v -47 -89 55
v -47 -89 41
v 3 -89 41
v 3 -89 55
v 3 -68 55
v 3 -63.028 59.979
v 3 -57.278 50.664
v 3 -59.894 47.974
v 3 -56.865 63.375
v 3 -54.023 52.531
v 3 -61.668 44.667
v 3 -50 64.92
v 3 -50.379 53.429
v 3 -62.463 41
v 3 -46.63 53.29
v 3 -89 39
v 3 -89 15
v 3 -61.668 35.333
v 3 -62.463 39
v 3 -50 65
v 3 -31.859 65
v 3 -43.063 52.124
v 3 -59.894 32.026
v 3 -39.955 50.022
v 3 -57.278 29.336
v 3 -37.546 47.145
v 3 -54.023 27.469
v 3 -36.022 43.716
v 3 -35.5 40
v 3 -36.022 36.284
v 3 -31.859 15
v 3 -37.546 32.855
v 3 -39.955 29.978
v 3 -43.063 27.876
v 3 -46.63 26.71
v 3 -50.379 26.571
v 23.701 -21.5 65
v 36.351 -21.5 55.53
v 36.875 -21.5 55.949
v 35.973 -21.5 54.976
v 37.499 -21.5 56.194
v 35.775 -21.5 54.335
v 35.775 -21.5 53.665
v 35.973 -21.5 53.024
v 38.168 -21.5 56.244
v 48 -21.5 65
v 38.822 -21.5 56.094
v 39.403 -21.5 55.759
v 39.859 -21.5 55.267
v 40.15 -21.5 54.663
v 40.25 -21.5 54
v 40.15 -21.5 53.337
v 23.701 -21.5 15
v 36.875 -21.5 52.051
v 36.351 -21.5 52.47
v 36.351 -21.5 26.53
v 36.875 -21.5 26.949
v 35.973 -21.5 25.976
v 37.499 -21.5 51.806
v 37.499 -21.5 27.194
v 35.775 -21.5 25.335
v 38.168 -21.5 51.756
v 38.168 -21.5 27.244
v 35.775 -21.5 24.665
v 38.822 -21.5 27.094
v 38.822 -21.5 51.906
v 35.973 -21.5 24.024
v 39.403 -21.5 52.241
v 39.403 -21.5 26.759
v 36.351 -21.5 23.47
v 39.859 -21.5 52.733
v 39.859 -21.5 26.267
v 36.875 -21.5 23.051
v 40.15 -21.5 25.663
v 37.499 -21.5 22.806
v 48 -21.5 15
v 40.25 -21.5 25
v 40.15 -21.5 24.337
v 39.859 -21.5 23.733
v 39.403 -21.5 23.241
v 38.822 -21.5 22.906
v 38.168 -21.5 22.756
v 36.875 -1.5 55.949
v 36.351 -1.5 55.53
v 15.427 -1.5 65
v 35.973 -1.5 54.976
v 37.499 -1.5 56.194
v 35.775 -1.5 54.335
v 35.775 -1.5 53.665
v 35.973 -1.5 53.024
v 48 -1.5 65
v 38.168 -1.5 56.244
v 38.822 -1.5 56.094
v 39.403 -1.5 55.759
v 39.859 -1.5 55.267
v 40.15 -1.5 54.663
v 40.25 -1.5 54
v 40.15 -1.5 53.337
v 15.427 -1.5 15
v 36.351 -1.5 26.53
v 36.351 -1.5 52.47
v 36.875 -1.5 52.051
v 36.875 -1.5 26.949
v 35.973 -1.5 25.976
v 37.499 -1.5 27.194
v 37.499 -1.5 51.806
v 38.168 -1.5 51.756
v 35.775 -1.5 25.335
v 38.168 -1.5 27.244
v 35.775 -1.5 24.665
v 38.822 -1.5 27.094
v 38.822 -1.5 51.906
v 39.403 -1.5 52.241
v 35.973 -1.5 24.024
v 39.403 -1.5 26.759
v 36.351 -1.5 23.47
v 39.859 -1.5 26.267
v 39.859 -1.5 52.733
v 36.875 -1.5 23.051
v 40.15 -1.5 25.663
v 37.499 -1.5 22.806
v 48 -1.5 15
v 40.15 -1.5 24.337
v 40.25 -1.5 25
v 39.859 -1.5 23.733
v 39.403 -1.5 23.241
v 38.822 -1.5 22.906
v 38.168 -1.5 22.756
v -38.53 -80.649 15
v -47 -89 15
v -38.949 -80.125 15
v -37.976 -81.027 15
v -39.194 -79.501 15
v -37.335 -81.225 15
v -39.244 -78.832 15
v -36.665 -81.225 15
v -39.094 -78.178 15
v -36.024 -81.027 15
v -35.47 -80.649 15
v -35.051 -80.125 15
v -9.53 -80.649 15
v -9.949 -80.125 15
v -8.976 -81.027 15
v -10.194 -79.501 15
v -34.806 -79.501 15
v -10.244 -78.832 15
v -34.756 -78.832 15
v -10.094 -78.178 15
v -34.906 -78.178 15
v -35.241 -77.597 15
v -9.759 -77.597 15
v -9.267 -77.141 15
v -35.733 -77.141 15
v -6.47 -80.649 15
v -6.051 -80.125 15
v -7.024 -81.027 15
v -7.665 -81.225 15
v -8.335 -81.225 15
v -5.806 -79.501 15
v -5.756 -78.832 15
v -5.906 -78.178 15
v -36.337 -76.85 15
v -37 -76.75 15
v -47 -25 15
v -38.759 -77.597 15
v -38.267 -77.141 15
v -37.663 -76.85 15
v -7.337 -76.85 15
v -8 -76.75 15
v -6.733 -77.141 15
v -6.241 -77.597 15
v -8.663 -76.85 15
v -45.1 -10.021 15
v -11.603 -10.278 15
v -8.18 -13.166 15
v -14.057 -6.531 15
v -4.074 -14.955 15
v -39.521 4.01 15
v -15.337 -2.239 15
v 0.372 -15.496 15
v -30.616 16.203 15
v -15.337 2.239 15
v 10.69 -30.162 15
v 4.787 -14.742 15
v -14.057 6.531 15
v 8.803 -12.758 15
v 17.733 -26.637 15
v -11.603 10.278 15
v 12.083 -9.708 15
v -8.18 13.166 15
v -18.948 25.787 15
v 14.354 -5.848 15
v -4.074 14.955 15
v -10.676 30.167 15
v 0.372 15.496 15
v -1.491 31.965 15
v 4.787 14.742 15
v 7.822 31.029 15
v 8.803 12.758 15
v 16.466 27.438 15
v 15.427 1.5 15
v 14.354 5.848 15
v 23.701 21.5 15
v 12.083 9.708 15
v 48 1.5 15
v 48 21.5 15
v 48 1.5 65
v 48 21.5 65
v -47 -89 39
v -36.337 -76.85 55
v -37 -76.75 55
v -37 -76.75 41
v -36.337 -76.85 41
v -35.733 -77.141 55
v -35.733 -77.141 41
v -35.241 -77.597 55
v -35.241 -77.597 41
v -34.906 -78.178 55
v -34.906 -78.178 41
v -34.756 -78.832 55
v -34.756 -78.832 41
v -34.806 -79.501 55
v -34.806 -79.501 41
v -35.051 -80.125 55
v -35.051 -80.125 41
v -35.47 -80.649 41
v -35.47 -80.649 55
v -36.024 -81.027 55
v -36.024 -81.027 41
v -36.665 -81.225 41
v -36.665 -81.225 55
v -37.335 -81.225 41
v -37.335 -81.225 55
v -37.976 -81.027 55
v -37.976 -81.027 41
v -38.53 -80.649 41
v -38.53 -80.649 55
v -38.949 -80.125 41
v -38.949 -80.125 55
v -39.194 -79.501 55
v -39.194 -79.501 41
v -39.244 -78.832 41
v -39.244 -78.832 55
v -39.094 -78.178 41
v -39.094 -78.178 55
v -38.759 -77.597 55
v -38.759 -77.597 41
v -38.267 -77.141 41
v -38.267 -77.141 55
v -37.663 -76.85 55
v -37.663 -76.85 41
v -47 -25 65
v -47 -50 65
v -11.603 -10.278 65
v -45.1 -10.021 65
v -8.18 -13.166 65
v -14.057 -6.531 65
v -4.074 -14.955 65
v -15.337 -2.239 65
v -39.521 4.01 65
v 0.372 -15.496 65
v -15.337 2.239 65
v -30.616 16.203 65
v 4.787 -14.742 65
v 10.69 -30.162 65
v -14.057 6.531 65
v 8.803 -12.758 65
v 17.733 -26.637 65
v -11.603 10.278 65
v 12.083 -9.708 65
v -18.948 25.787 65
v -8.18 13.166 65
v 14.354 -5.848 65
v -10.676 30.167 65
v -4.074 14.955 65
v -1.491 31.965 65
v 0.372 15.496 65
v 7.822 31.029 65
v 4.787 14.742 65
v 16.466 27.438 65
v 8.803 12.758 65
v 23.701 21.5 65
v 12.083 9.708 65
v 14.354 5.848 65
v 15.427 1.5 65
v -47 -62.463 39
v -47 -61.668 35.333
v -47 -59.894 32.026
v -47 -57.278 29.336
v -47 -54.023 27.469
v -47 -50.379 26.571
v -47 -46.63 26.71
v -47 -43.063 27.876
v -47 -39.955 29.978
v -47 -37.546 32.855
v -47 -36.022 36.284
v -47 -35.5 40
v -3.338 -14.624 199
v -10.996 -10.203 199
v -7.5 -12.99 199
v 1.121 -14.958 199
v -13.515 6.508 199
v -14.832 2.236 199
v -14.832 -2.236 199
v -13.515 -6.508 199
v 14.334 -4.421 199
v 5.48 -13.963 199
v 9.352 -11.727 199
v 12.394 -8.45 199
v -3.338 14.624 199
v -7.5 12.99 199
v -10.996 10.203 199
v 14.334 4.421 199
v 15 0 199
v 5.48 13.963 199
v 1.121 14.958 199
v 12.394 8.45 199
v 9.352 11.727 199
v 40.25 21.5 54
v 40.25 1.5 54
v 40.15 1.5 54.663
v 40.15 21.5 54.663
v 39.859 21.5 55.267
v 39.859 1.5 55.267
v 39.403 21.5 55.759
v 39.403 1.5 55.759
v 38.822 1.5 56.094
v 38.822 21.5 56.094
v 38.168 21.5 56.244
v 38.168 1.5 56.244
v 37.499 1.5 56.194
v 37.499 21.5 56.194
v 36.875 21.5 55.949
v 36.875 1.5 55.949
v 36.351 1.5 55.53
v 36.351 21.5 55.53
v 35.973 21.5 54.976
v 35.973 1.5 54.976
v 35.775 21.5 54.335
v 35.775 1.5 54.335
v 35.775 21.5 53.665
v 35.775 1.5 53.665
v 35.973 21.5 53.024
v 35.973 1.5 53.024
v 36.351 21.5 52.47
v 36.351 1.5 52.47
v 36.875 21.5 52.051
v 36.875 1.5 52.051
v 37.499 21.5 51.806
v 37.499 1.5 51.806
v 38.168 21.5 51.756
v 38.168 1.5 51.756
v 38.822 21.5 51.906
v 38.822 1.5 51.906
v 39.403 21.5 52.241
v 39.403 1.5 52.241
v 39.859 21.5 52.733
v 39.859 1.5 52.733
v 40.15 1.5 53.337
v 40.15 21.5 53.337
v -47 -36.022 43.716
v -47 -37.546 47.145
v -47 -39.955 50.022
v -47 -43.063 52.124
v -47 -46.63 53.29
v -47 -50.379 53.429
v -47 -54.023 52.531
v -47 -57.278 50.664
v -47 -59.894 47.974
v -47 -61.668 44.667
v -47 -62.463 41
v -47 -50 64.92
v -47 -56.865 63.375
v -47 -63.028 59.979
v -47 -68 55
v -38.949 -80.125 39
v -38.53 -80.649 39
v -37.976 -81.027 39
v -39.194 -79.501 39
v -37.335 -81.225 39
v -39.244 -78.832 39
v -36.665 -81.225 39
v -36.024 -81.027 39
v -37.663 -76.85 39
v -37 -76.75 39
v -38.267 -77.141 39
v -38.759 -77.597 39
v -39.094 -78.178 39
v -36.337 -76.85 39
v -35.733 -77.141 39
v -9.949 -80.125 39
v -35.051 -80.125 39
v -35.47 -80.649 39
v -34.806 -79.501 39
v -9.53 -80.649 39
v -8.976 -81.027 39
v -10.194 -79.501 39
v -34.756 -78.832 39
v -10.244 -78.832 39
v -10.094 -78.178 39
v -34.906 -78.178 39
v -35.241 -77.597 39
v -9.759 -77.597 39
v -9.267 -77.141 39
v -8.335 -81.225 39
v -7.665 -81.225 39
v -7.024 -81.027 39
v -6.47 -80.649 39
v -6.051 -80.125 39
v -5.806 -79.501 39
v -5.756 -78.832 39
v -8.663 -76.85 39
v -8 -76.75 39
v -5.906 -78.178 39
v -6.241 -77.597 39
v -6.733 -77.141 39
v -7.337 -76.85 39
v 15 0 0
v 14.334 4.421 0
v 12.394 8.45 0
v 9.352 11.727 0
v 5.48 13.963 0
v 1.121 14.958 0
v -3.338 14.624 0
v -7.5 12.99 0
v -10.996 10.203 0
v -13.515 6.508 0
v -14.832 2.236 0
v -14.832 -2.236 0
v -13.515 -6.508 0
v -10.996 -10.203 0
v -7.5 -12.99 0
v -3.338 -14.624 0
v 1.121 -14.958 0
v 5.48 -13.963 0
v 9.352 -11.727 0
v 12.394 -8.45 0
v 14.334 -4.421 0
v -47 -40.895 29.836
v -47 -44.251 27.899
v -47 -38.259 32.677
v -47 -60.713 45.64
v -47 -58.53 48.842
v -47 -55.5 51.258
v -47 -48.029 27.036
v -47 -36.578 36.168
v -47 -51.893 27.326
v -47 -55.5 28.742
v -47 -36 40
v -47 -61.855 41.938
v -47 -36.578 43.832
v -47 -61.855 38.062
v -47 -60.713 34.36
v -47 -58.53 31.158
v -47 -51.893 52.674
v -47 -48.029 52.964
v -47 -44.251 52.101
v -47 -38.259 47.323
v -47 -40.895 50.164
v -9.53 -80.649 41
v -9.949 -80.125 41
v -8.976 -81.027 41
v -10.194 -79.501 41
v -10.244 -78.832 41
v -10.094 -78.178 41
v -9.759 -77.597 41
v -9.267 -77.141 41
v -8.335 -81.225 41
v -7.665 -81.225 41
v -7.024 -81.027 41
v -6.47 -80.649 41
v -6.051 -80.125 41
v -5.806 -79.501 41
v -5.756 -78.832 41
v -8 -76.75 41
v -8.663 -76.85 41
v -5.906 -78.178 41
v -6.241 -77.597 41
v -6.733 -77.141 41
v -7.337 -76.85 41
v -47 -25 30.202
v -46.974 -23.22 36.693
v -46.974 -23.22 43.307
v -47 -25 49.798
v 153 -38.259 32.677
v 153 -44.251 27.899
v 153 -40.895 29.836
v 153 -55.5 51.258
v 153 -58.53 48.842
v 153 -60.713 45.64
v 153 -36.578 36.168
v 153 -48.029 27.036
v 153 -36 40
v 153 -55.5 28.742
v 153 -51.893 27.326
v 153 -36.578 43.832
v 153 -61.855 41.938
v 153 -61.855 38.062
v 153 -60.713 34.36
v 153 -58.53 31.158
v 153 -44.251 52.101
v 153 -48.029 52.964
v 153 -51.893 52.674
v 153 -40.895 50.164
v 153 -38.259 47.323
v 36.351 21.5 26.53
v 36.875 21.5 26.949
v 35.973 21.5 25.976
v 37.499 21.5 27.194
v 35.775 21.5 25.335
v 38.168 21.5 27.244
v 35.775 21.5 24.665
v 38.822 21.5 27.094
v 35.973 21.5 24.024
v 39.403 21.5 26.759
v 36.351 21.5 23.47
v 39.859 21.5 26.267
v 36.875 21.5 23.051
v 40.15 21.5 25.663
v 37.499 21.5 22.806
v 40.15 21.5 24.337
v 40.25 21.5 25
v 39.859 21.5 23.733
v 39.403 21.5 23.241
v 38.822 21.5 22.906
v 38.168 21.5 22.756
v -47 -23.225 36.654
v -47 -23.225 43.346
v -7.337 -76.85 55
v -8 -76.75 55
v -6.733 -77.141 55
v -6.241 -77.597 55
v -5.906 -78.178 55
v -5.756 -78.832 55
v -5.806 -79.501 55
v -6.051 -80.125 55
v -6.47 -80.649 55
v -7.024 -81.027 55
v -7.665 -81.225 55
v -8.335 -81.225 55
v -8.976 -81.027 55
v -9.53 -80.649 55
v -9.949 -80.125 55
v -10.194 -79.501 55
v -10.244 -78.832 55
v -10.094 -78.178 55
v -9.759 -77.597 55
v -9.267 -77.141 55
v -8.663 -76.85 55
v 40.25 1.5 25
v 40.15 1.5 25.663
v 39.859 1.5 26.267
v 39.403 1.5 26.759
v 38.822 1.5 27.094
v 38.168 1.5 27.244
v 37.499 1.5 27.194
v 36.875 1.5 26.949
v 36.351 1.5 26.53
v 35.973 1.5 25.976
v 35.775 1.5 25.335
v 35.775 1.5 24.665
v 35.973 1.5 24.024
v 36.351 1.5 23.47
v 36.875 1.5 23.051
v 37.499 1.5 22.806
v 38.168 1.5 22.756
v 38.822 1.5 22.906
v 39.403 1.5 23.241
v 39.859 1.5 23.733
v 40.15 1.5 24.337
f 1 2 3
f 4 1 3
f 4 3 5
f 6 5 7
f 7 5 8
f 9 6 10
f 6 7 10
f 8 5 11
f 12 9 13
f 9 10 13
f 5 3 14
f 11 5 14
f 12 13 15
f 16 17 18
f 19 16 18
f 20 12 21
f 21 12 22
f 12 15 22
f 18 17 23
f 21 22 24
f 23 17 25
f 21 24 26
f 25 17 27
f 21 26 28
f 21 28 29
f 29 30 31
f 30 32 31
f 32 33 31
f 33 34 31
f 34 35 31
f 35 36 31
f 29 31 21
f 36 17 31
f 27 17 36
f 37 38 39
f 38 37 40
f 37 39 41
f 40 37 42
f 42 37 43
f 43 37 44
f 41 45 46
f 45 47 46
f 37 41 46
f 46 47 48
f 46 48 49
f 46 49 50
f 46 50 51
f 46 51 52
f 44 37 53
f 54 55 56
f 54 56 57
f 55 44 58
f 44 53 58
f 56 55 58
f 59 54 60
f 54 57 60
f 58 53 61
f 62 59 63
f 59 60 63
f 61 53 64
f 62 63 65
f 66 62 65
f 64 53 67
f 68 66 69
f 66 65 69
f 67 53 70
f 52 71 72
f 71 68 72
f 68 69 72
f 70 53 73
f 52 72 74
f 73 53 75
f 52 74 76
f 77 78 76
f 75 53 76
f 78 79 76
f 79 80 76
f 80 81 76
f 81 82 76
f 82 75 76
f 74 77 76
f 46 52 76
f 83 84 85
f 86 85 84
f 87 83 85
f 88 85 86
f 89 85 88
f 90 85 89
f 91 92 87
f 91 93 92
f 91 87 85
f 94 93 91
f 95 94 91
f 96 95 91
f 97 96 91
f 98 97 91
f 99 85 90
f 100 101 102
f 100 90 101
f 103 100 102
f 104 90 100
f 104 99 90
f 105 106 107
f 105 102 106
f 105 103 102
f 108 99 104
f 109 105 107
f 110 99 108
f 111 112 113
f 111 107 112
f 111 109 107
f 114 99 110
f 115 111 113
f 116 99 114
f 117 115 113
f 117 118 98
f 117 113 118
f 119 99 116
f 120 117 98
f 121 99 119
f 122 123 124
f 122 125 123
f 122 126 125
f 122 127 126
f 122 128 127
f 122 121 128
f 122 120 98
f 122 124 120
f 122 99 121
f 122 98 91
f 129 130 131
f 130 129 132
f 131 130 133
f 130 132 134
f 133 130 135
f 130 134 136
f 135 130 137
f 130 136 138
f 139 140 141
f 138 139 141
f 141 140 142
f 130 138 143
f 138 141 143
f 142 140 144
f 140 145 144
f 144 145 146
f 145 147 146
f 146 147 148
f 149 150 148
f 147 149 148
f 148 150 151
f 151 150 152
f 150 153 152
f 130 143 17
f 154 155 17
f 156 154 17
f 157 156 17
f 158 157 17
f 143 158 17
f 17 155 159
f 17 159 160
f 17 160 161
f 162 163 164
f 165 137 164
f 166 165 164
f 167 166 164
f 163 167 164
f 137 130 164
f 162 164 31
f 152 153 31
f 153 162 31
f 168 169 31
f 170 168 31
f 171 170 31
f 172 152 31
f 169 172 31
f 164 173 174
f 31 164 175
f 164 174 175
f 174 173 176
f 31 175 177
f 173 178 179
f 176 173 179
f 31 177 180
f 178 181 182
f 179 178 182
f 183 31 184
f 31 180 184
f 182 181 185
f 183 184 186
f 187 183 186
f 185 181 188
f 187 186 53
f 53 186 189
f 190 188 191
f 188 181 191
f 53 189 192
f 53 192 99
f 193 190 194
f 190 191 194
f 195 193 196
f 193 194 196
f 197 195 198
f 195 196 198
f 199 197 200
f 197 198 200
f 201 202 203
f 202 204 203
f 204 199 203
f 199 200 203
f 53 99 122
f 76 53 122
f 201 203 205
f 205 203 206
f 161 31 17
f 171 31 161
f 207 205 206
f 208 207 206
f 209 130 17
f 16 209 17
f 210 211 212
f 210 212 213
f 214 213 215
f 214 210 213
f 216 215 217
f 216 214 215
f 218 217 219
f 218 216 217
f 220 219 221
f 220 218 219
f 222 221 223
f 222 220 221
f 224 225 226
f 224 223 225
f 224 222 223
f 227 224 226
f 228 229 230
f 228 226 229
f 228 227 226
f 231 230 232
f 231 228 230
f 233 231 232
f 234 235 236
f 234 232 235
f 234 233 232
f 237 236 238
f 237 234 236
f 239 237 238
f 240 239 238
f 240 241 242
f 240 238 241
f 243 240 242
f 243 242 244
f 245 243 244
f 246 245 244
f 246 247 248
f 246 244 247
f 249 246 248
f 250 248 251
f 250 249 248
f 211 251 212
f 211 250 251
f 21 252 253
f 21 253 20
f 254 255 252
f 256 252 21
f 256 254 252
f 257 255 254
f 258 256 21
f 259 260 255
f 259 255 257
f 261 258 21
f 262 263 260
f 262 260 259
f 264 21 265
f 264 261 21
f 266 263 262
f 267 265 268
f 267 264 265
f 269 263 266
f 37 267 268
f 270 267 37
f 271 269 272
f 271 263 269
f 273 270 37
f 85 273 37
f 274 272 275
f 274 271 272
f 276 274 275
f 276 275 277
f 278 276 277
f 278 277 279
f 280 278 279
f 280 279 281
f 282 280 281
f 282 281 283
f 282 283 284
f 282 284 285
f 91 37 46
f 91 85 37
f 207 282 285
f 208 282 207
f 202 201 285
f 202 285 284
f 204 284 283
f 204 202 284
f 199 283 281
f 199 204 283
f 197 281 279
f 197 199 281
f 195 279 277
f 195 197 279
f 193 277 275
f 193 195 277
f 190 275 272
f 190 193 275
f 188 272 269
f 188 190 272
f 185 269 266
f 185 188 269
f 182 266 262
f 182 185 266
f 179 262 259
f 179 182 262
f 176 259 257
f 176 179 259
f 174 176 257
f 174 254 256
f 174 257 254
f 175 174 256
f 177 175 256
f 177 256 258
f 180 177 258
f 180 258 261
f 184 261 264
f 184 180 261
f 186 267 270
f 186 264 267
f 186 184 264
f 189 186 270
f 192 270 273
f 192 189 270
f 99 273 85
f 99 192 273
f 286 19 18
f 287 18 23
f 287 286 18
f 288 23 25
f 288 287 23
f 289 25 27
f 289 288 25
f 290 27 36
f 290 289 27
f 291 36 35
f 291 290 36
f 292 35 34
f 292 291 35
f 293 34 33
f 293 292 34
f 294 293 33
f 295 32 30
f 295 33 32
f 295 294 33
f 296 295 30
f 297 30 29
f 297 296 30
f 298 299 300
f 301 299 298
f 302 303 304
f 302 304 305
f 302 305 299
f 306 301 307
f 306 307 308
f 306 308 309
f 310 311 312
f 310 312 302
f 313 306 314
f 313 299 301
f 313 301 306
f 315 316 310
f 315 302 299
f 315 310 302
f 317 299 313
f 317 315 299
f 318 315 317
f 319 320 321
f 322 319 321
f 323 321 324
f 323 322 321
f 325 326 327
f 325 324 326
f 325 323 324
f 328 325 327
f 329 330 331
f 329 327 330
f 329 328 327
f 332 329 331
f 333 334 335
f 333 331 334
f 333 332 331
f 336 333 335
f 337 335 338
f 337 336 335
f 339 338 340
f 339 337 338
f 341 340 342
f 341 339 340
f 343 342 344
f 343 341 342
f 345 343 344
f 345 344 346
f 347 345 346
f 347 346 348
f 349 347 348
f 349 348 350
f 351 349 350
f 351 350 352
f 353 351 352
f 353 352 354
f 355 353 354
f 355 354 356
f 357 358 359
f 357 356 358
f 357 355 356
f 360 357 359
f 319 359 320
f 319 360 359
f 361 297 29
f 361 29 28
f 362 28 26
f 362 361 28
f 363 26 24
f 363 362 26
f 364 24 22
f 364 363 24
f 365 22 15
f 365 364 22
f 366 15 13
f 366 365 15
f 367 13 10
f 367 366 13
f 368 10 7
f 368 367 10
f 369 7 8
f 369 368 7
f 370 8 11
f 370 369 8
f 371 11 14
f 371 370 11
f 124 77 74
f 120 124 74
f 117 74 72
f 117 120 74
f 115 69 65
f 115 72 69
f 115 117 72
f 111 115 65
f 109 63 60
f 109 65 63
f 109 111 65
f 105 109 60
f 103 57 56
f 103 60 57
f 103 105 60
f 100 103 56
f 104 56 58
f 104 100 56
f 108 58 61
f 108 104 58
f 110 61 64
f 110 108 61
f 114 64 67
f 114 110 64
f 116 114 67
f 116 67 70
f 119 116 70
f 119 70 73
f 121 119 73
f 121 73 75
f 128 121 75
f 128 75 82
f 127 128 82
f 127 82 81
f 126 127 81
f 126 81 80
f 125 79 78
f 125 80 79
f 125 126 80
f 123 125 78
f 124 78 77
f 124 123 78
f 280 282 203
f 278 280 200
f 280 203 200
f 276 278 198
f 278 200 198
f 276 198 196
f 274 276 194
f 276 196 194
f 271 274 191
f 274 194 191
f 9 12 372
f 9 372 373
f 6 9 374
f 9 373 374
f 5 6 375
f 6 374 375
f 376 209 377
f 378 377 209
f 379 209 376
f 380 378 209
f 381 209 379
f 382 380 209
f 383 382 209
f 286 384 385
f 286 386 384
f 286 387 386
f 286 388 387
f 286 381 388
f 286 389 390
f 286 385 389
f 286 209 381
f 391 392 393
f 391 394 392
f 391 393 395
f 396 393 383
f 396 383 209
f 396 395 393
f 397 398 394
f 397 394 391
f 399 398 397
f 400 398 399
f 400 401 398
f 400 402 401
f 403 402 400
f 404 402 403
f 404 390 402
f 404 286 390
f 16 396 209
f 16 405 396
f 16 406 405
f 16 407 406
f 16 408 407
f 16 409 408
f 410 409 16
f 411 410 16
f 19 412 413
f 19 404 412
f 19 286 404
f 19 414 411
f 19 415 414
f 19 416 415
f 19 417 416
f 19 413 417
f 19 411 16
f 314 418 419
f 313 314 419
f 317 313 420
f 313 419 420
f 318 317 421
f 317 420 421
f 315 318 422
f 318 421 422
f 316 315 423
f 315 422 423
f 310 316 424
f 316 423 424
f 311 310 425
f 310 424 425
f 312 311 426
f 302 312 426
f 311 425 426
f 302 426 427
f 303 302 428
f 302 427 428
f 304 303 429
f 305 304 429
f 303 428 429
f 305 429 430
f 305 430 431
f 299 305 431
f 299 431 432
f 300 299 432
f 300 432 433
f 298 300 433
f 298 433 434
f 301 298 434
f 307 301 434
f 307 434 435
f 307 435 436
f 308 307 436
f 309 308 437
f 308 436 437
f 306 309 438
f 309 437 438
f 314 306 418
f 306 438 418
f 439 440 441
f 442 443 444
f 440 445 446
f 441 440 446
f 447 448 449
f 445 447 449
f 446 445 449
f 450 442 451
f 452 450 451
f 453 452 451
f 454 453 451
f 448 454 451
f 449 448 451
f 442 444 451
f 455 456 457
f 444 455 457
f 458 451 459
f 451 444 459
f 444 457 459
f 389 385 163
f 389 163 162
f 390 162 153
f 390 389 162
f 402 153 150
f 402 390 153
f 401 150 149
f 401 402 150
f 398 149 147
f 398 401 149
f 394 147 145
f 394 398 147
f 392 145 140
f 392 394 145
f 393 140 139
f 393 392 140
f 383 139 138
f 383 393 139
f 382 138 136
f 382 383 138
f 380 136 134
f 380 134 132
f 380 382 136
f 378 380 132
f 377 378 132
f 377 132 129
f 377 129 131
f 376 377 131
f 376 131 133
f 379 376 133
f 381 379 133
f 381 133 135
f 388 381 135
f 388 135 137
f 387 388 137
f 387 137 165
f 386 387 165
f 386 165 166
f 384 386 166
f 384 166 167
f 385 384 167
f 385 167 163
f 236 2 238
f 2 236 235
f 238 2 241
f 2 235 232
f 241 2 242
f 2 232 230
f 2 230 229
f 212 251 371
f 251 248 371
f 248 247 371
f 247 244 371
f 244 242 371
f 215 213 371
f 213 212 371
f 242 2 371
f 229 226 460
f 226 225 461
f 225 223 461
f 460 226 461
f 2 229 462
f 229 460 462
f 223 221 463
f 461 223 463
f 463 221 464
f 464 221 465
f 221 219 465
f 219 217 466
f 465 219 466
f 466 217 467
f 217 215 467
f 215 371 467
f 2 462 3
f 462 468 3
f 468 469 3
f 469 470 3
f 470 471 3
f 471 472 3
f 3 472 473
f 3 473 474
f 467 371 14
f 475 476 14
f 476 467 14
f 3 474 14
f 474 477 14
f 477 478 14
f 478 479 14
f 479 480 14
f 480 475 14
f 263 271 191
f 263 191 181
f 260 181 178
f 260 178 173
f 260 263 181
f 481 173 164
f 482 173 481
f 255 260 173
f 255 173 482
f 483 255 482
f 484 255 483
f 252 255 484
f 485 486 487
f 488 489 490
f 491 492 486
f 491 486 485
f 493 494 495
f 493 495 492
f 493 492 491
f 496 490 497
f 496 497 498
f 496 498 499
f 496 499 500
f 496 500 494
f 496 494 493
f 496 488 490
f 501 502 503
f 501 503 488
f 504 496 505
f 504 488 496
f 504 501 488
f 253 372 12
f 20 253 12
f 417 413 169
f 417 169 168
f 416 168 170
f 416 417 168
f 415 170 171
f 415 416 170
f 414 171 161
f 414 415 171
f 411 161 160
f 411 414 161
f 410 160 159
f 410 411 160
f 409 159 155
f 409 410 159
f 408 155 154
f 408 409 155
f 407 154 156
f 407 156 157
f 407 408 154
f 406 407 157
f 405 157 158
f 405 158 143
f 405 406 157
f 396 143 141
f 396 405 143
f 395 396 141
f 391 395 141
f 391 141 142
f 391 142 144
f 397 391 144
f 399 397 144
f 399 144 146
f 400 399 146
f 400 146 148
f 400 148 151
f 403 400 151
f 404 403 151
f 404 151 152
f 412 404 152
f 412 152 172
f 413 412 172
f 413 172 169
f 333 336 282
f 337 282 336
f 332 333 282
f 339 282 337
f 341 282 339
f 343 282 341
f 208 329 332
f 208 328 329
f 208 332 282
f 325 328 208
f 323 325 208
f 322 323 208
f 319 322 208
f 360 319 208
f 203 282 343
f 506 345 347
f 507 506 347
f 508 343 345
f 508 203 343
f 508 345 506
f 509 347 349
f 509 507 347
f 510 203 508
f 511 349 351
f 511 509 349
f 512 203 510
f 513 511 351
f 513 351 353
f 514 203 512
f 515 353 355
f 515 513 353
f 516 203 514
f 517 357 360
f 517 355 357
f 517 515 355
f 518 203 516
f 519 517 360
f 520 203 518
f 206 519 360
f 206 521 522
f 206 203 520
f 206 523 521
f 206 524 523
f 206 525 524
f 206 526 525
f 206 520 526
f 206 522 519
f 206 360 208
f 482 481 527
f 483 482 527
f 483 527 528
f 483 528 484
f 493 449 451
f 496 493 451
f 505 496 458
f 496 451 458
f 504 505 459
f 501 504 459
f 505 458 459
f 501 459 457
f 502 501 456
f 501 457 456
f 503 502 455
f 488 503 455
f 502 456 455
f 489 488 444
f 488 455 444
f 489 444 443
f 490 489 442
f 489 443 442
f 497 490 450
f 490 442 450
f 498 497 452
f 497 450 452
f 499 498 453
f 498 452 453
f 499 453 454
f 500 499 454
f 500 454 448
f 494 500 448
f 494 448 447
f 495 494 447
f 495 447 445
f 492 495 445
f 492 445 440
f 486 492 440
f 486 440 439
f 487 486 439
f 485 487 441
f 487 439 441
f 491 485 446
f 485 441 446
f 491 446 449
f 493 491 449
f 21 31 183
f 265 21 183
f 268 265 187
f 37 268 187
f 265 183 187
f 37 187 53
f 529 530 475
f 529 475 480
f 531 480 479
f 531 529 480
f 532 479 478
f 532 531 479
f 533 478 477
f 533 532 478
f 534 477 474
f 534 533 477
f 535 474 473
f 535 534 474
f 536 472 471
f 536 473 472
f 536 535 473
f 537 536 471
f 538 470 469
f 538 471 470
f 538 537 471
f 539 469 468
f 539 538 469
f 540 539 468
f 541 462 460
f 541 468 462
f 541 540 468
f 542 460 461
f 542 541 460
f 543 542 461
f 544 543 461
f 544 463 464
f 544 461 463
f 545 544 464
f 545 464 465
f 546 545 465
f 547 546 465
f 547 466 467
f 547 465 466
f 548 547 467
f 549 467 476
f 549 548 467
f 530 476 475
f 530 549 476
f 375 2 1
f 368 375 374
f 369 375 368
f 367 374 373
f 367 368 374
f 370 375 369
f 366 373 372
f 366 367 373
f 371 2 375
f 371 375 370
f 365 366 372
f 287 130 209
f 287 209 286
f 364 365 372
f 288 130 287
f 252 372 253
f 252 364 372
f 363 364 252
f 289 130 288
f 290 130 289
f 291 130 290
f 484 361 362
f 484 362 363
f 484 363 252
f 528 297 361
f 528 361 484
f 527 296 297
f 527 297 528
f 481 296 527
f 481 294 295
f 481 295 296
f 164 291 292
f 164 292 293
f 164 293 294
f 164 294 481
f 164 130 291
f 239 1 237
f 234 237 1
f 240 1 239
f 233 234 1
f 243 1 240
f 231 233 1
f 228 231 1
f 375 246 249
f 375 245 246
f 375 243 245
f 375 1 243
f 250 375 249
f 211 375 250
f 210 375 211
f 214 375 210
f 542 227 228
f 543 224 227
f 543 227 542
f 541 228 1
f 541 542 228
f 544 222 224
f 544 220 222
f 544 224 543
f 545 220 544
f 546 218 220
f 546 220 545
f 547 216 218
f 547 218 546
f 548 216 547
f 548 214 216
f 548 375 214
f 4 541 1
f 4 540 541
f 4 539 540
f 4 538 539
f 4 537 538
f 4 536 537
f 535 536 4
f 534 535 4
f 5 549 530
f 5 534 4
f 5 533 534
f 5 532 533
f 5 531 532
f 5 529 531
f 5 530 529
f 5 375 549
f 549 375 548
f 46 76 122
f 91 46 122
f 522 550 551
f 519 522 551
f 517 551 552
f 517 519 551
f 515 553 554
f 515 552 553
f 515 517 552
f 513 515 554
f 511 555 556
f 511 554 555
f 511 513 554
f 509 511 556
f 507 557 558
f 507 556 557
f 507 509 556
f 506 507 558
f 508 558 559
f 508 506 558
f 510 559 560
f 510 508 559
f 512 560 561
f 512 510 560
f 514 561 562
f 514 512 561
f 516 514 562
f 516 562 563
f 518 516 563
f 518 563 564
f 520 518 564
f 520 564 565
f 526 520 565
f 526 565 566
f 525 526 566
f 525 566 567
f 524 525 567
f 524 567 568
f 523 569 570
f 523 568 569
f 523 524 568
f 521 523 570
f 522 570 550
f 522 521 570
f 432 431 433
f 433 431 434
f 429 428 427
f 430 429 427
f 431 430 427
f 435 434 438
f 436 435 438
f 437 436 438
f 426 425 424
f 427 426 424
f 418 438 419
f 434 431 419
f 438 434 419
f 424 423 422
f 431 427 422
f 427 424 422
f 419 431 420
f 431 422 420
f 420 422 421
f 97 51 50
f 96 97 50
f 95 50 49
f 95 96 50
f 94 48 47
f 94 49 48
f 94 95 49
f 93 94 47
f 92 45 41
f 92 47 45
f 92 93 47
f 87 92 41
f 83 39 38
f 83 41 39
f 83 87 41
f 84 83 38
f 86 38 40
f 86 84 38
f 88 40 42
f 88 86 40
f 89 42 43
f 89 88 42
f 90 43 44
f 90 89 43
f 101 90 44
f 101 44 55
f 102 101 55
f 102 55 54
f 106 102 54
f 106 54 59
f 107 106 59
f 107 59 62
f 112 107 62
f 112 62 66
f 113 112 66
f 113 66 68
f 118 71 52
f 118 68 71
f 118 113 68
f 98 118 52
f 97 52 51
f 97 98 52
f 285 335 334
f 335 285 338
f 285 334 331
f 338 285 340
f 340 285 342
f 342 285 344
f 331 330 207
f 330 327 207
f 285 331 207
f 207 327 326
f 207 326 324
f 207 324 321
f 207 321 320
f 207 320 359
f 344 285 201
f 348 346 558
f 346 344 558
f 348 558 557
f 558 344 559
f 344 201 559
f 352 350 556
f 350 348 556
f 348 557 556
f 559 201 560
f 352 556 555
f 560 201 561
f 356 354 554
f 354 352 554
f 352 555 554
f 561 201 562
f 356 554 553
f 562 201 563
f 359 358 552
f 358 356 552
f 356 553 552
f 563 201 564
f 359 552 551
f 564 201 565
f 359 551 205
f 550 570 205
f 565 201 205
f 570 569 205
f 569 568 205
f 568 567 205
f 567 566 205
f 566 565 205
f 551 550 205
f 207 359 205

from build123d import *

# Parameters (mm, degrees)
CYLINDER_R                  = 15
CYLINDER_DEPTH              = 199
CYLINDER001_R               = 13
CYLINDER001_DEPTH           = 200
CYLINDER005_R               = 2.25
CYLINDER005_DEPTH           = 50
CYLINDER006_R               = 2.25
CYLINDER006_DEPTH           = 50
FUSION_ROLL_ANGLE           = 90
FUSION_PLACEMENT_ANGLE      = 90
CYLINDER007_R               = 2.25
CYLINDER007_DEPTH           = 50
CYLINDER008_R               = 2.25
CYLINDER008_DEPTH           = 50
CYLINDER004_R               = 15.5
CYLINDER004_DEPTH           = 199
CYLINDER003_R               = 13.5
CYLINDER003_DEPTH           = 200
BOX006_W                    = 50
BOX006_H                    = 27
BOX006_DEPTH                = 2
BOX_W                       = 20
BOX_H                       = 3
BOX_DEPTH                   = 50
CYLINDER002_W               = 60
CYLINDER002_H               = 50
CYLINDER002_ANGLE           = 60
CYLINDER002_PLACEMENT_ANGLE = 120
BOX005_W                    = 50
BOX005_H                    = 24
BOX005_DEPTH                = 14
BOX004_W                    = 50
BOX004_H                    = 25
BOX004_DEPTH                = 14
BOX003_W                    = 50
BOX003_H                    = 63
BOX003_DEPTH                = 10
BOX002_W                    = 25
BOX002_H                    = 20
BOX002_DEPTH                = 50
BOX001_W                    = 25
BOX001_H                    = 20
BOX001_DEPTH                = 50
TUBE001_R                   = 25
TUBE001_R_2                 = 13.5
TUBE001_DEPTH               = 50
TUBE_R                      = 32
TUBE_R_2                    = 15.5
TUBE_DEPTH                  = 50
BOX007_W                    = 50
BOX007_H                    = 25
BOX007_DEPTH                = 50


with BuildPart() as horizontal:
    # Cylinder → Cylinder (new body)
    with BuildSketch(Plane.XY):
        Circle(CYLINDER_R)
    extrude(amount=CYLINDER_DEPTH)


with BuildPart() as vertical:
    # Cylinder001 → Cylinder001 (new body)
    with BuildSketch(Plane(origin=(-47, -49, 40), x_dir=(0, 1, 0), z_dir=(1, 0, 0))):
        Circle(CYLINDER001_R)
    extrude(amount=CYLINDER001_DEPTH)


with BuildPart() as m4s:
    # Cylinder005 → Cylinder005 (new body)
    with BuildSketch(Plane(origin=(38, 22, 25), x_dir=(1, 0, 0), z_dir=(0, -1, 0))):
        Circle(CYLINDER005_R)
    extrude(amount=CYLINDER005_DEPTH)


with BuildPart() as m4s002:
    # Cylinder006 → Cylinder006 (new body)
    with BuildSketch(Plane(origin=(38, 22, 54), x_dir=(1, 0, 0), z_dir=(0, -1, 0))):
        Circle(CYLINDER006_R)
    extrude(amount=CYLINDER006_DEPTH)

    # Fusion: union m4s
    add(m4s.part)


with BuildPart() as m4s002_1:
    # Fusion roll: moved
    add(m4s002.part.rotate(Axis((0, 0, 0), (1, 0, 0)), FUSION_ROLL_ANGLE))


with BuildPart() as m4s002_2:
    # Fusion placement: moved
    add(m4s002_1.part.moved(Location((-62, -117, 43))).rotate(Axis((-62, -117, 43), (0, 0, 1)), FUSION_PLACEMENT_ANGLE))


with BuildPart() as m4s004:
    # Cylinder007 → Cylinder007 (new body)
    with BuildSketch(Plane(origin=(38, 22, 25), x_dir=(1, 0, 0), z_dir=(0, -1, 0))):
        Circle(CYLINDER007_R)
    extrude(amount=CYLINDER007_DEPTH)


with BuildPart() as m4s003:
    # Cylinder008 → Cylinder008 (new body)
    with BuildSketch(Plane(origin=(38, 22, 54), x_dir=(1, 0, 0), z_dir=(0, -1, 0))):
        Circle(CYLINDER008_R)
    extrude(amount=CYLINDER008_DEPTH)

    # Fusion001: union m4s004
    add(m4s004.part)


with BuildPart() as horizontal001cuts:
    # Cylinder004 → Cylinder004 (new body)
    with BuildSketch(Plane.XY):
        Circle(CYLINDER004_R)
    extrude(amount=CYLINDER004_DEPTH)


with BuildPart() as vertical001cuts:
    # Cylinder003 → Cylinder003 (new body)
    with BuildSketch(Plane(origin=(-47, -49, 40), x_dir=(0, 1, 0), z_dir=(1, 0, 0))):
        Circle(CYLINDER003_R)
    extrude(amount=CYLINDER003_DEPTH)


with BuildPart() as vercuts:
    # Box006 → Box006 (new body)
    with BuildSketch(Plane(origin=(-47, -89, 39), x_dir=(1, 0, 0), z_dir=(0, 0, 1))):
        with Locations((25, 13.5)):
            Rectangle(BOX006_W, BOX006_H)
    extrude(amount=BOX006_DEPTH)


with BuildPart() as cuts:
    # Box → Box (new body)
    with BuildSketch(Plane(origin=(14, -1.5, 15), x_dir=(1, 0, 0), z_dir=(0, 0, 1))):
        with Locations((10, 1.5)):
            Rectangle(BOX_W, BOX_H)
    extrude(amount=BOX_DEPTH)

    # Fusion002: union m4s002, m4s003, Horizontal001Cuts, Vertical001Cuts, verCuts
    add(m4s002_2.part)
    add(m4s003.part)
    add(horizontal001cuts.part)
    add(vertical001cuts.part)
    add(vercuts.part)


with BuildPart() as addcylinder:
    # Cylinder002 → Cylinder002 (revolve)
    with BuildSketch(Plane.XZ):
        with Locations((30, 25)):
            Rectangle(CYLINDER002_W, CYLINDER002_H)
    revolve(axis=Axis((0, 0, 0), (0, 0, 1)), revolution_arc=CYLINDER002_ANGLE)


with BuildPart() as addcylinder_1:
    # Cylinder002 placement: moved
    add(addcylinder.part.moved(Location((13, -25, 15))).rotate(Axis((13, -25, 15), (0, 0, 1)), CYLINDER002_PLACEMENT_ANGLE))


with BuildPart() as veraddons002:
    # Box005 → Box005 (new body)
    with BuildSketch(Plane(origin=(-47, -89, 41), x_dir=(1, 0, 0), z_dir=(0, 0, 1))):
        with Locations((25, 12)):
            Rectangle(BOX005_W, BOX005_H)
    extrude(amount=BOX005_DEPTH)


with BuildPart() as veraddons001:
    # Box004 → Box004 (new body)
    with BuildSketch(Plane(origin=(-47, -89, 25), x_dir=(1, 0, 0), z_dir=(0, 0, 1))):
        with Locations((25, 12.5)):
            Rectangle(BOX004_W, BOX004_H)
    extrude(amount=BOX004_DEPTH)


with BuildPart() as veraddons:
    # Box003 → Box003 (new body)
    with BuildSketch(Plane(origin=(-47, -89, 15), x_dir=(1, 0, 0), z_dir=(0, 0, 1))):
        with Locations((25, 31.5)):
            Rectangle(BOX003_W, BOX003_H)
    extrude(amount=BOX003_DEPTH)


with BuildPart() as horadd001:
    # Box002 → Box002 (new body)
    with BuildSketch(Plane(origin=(23, 1.5, 15), x_dir=(1, 0, 0), z_dir=(0, 0, 1))):
        with Locations((12.5, 10)):
            Rectangle(BOX002_W, BOX002_H)
    extrude(amount=BOX002_DEPTH)


with BuildPart() as horadd:
    # Box001 → Box001 (new body)
    with BuildSketch(Plane(origin=(23, -21.5, 15), x_dir=(1, 0, 0), z_dir=(0, 0, 1))):
        with Locations((12.5, 10)):
            Rectangle(BOX001_W, BOX001_H)
    extrude(amount=BOX001_DEPTH)


with BuildPart() as tubeaddons001:
    # Tube001 → Tube001 (new body)
    with BuildSketch(Plane(origin=(-47, -48, 40), x_dir=(0, 0, -1), z_dir=(1, 0, 0))):
        Circle(TUBE001_R)
        Circle(TUBE001_R_2, mode=Mode.SUBTRACT)
    extrude(amount=TUBE001_DEPTH)


with BuildPart() as tubeaddons:
    # Tube → Tube (new body)
    with BuildSketch(Plane.XY.offset(15)):
        Circle(TUBE_R)
        Circle(TUBE_R_2, mode=Mode.SUBTRACT)
    extrude(amount=TUBE_DEPTH)


with BuildPart() as left:
    # Box007 → Box007 (new body)
    with BuildSketch(Plane(origin=(-47, -50, 15), x_dir=(1, 0, 0), z_dir=(0, 0, 1))):
        with Locations((25, 12.5)):
            Rectangle(BOX007_W, BOX007_H)
    extrude(amount=BOX007_DEPTH)

    # Fusion003: union AddCylinder, VerAddons002, VerAddons001, VerAddons, horAdd001, horAdd, TubeAddons001, TubeAddons
    add(addcylinder_1.part)
    add(veraddons002.part)
    add(veraddons001.part)
    add(veraddons.part)
    add(horadd001.part)
    add(horadd.part)
    add(tubeaddons001.part)
    add(tubeaddons.part)

    # Cut: cut cuts
    add(cuts.part, mode=Mode.SUBTRACT)


solid = Compound([horizontal.part, vertical.part, left.part])
